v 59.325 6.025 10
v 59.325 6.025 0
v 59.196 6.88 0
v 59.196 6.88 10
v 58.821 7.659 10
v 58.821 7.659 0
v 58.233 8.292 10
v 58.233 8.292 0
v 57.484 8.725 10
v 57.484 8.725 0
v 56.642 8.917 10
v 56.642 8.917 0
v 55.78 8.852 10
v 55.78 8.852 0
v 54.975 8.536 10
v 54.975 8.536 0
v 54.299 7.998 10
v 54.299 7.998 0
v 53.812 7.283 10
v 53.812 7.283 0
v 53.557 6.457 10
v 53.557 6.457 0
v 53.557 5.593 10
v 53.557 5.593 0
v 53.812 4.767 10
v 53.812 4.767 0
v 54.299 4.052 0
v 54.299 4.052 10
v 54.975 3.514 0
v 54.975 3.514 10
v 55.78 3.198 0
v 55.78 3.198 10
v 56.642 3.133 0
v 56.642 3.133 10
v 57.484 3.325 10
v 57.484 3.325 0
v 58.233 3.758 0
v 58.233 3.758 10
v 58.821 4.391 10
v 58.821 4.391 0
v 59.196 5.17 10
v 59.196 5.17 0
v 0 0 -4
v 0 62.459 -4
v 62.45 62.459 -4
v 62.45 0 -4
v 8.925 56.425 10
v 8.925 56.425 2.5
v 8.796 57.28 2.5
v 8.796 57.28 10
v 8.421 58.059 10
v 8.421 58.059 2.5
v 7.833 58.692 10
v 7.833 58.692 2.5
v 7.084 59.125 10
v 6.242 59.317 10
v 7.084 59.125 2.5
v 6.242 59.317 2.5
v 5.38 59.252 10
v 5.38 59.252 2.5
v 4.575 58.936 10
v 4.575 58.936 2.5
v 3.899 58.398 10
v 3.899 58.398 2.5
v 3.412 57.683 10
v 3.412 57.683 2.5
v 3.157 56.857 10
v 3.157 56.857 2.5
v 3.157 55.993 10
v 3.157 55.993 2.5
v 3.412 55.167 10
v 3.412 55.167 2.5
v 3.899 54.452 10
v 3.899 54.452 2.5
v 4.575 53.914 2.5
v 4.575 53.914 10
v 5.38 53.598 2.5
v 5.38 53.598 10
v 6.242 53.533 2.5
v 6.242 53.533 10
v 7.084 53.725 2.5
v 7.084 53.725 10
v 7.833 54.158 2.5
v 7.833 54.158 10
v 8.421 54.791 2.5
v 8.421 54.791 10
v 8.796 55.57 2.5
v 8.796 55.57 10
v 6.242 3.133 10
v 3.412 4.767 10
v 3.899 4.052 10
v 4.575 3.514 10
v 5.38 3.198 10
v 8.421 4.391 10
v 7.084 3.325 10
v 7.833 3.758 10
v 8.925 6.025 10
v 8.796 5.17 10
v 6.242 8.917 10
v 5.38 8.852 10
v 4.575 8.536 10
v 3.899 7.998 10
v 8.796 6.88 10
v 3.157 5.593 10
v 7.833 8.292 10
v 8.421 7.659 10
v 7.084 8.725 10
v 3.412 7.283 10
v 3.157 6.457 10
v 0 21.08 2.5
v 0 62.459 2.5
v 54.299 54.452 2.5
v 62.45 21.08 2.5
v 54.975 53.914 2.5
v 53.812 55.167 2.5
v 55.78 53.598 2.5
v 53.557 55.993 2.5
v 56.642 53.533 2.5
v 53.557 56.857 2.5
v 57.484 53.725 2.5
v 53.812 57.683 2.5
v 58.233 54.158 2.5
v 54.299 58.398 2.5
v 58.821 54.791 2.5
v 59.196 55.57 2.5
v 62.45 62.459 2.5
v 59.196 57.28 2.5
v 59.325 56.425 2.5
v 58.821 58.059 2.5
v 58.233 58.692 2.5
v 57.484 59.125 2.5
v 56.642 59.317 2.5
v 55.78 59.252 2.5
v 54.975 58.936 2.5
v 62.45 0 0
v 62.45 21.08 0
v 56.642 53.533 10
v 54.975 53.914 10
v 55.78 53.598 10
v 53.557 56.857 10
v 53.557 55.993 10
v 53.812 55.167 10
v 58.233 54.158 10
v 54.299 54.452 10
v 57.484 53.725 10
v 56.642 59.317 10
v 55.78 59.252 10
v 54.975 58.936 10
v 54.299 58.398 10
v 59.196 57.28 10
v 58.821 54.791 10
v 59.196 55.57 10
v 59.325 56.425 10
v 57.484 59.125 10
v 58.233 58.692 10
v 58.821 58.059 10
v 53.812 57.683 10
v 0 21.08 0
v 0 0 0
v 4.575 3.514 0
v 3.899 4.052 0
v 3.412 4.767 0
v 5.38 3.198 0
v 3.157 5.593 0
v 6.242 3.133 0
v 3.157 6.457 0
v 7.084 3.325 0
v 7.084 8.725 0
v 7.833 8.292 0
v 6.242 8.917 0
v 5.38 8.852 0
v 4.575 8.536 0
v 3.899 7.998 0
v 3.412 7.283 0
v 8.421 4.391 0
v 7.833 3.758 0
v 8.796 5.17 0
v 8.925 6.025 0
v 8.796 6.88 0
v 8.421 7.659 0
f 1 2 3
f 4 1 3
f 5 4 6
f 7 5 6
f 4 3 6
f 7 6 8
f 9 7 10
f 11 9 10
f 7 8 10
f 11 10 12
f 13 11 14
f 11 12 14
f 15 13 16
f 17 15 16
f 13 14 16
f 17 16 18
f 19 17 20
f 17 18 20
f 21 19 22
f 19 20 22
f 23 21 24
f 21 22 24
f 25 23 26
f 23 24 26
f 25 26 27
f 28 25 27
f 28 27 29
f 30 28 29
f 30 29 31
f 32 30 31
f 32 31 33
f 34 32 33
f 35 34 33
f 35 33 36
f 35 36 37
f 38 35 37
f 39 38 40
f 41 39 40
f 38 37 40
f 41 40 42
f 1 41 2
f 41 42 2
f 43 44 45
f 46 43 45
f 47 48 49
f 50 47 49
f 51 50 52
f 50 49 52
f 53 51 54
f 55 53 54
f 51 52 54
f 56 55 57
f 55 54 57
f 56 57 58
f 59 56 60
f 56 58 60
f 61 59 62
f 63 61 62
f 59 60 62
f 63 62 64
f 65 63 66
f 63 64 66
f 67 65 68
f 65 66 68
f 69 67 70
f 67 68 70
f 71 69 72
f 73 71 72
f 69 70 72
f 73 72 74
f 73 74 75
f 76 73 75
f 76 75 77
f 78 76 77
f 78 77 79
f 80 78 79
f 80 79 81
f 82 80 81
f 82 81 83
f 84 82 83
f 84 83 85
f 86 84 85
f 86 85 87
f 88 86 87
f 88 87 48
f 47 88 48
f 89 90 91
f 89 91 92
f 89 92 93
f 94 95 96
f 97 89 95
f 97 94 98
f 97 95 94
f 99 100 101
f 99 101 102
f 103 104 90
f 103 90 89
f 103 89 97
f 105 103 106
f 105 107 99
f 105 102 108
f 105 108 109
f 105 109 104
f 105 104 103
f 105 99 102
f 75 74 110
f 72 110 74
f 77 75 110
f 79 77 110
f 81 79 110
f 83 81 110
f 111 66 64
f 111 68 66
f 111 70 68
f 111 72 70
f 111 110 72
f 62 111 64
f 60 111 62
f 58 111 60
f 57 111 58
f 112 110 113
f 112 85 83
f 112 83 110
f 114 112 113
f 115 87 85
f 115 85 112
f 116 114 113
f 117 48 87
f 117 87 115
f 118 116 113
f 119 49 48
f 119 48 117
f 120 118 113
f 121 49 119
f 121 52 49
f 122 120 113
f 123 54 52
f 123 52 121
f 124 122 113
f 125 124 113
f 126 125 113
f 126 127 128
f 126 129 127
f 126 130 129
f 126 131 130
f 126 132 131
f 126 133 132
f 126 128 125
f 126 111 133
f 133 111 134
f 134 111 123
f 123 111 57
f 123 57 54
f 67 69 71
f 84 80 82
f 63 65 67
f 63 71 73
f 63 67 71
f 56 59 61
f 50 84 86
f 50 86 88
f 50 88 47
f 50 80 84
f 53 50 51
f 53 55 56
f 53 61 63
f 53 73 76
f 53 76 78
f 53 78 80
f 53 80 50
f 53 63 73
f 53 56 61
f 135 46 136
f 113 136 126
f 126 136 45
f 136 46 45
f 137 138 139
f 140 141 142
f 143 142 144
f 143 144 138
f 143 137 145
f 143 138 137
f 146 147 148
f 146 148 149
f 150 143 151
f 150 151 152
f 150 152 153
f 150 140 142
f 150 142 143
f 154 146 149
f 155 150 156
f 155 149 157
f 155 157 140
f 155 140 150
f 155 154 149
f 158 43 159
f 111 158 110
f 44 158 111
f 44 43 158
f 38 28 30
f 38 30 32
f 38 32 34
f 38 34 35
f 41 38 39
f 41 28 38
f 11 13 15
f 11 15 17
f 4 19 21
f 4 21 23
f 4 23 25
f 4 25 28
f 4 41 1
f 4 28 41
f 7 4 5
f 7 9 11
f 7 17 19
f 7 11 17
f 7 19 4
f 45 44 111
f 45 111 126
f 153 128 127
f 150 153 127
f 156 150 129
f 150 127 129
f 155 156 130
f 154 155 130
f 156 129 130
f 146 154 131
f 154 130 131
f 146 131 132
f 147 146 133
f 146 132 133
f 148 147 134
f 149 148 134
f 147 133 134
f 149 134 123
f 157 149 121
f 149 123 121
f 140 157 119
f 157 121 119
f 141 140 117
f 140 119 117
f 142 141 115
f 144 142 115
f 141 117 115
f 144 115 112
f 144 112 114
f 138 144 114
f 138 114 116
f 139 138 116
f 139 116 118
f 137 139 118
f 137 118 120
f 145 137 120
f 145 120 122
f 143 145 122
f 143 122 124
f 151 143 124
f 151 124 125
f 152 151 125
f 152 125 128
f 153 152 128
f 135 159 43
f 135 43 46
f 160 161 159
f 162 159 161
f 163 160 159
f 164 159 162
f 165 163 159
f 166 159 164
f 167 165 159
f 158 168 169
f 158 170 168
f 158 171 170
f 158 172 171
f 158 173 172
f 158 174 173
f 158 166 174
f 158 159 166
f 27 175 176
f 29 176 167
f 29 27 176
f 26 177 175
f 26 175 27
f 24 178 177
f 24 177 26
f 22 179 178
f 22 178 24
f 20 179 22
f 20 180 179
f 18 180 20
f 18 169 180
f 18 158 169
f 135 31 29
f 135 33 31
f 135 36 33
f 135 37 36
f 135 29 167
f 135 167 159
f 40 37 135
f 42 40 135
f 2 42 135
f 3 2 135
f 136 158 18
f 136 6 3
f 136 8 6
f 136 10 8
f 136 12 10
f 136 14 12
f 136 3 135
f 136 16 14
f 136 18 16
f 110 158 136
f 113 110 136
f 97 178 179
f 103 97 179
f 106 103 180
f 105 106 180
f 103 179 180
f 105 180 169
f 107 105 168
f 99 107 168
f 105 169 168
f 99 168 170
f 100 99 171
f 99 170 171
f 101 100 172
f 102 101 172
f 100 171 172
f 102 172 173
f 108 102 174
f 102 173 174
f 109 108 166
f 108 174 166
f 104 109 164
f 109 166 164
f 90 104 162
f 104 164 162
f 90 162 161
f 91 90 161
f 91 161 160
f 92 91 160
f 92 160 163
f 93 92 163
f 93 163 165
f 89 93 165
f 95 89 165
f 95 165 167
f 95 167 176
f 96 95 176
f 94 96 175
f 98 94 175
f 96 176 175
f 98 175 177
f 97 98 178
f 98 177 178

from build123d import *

# Parameters (mm, degrees)
F0_W     = 62.45
F0_H     = 62.4586
F1_DEPTH = 4
F2_R     = 2.9
F4_DEPTH = 10
F3_R     = 2.9
F5_DEPTH = 10
F6_W     = 62.45
F6_H     = 41.379086
F6_R     = 2.9
F7_DEPTH = 2.5


with BuildPart() as f1:
    # F0 (on Top) → F1 (new body)
    with BuildSketch(Plane.XY):
        with Locations((31.225, 31.2293)):
            Rectangle(F0_W, F0_H)
    extrude(amount=-F1_DEPTH)

    # F2 (on face) → F4 (join)
    with BuildSketch(Plane.XY):
        with Locations((6.025, 6.025)):
            Circle(F2_R)
        with Locations((56.425, 6.025)):
            Circle(F2_R)
    extrude(amount=F4_DEPTH)

    # F3 (on face) → F5 (join)
    with BuildSketch(Plane.XY):
        with Locations((56.425, 56.425)):
            Circle(F3_R)
        with Locations((6.025, 56.425)):
            Circle(F3_R)
    extrude(amount=F5_DEPTH)

    # F6 (on face) → F7 (join)
    with BuildSketch(Plane.XY):
        with Locations((31.225, 41.769057)):
            Rectangle(F6_W, F6_H)
        with Locations((6.025, 56.425)):
            Circle(F6_R, mode=Mode.SUBTRACT)
        with Locations((56.425, 56.425)):
            Circle(F6_R, mode=Mode.SUBTRACT)
    extrude(amount=F7_DEPTH)


solid = f1.part
